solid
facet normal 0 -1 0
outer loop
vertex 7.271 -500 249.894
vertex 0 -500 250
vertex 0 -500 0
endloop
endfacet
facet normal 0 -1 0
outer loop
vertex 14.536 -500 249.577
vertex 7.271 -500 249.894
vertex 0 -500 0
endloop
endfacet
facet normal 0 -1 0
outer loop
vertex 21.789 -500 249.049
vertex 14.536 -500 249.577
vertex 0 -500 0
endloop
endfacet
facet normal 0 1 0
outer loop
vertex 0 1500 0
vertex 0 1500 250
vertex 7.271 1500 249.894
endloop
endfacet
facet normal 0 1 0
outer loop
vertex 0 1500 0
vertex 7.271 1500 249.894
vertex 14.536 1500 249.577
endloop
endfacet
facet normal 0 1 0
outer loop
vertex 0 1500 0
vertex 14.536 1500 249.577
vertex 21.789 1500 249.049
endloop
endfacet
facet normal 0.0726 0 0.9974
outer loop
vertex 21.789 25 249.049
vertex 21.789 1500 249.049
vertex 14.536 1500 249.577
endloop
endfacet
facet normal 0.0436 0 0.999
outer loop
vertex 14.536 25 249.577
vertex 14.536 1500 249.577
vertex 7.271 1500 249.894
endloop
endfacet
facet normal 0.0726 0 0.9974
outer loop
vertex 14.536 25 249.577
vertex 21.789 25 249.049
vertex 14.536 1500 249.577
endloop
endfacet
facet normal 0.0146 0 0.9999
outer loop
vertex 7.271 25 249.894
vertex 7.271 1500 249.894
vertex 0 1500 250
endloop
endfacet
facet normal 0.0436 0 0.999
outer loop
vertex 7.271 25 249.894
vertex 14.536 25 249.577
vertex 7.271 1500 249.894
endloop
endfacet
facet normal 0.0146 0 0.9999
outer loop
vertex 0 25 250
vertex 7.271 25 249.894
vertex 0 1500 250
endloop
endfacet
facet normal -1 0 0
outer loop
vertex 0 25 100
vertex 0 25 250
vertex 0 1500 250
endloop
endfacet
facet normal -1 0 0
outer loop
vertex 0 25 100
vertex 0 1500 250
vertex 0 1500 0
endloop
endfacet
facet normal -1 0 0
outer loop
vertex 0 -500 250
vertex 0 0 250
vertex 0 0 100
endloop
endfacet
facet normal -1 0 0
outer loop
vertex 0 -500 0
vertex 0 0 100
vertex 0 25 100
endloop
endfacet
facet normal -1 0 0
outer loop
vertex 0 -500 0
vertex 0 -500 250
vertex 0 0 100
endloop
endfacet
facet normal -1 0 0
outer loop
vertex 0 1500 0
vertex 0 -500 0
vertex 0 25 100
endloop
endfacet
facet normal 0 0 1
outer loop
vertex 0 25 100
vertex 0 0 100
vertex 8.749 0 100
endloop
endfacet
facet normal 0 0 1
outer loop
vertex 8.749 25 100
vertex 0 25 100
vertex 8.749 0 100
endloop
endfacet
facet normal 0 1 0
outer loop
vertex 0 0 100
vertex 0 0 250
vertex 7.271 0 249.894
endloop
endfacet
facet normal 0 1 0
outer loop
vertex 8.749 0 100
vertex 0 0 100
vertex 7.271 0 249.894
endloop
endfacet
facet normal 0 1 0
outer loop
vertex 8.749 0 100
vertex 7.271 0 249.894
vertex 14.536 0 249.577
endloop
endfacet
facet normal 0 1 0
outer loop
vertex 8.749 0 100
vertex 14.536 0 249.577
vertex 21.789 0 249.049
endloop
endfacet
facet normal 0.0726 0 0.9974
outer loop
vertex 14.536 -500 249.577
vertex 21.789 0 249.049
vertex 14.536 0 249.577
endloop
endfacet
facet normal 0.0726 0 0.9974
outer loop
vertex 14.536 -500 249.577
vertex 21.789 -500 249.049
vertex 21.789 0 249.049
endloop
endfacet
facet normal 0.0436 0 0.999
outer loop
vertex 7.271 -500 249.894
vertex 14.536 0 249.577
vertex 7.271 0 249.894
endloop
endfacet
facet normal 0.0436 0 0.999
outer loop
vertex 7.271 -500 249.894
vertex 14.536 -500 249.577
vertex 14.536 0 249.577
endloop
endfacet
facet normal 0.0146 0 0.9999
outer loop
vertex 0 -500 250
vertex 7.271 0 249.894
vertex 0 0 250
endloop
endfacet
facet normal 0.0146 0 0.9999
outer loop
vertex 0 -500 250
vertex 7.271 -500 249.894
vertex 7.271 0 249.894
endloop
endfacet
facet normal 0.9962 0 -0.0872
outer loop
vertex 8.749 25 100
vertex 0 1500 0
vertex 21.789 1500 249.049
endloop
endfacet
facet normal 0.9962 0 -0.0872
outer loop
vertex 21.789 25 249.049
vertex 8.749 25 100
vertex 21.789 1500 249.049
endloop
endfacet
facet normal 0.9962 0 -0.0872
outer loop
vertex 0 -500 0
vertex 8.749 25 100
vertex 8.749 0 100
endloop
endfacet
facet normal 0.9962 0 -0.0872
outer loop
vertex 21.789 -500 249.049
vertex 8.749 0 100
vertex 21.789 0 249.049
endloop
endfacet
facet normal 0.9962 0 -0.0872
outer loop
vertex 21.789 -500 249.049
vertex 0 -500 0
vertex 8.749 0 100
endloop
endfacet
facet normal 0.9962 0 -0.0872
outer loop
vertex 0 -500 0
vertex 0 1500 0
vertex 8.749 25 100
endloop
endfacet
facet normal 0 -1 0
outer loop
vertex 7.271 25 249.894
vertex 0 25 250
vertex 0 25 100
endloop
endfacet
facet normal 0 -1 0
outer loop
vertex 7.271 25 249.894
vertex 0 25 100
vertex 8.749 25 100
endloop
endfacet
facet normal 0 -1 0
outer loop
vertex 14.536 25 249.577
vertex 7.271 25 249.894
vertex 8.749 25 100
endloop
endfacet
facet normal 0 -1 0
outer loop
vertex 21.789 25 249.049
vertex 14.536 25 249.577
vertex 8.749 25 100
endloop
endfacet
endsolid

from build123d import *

# Parameters (mm, degrees)
F0_R     = 250
F2_DEPTH = 500
F1_R     = 250
F1_W     = 200
F1_H     = 200
F3_DEPTH = 1500
F1_W_2   = 959.411026
F1_H_2   = 659
F4_DEPTH = 25
F6_DEPTH = 2000


with BuildPart() as f2:
    # F0 (on Front) → F2 (new body)
    with BuildSketch(Plane.XZ):
        Circle(F0_R)
    extrude(amount=F2_DEPTH)

    # F1 (on face) → F3 (join)
    with BuildSketch(Plane.XZ):
        Circle(F1_R)
        Rectangle(F1_W, F1_H, mode=Mode.SUBTRACT)
        Rectangle(F1_W, F1_H)
    extrude(amount=-F3_DEPTH)

    # F1 (on face) → F4 (cut)
    with BuildSketch(Plane.XZ):
        Rectangle(F1_W_2, F1_H_2)
        Rectangle(F1_W, F1_H, mode=Mode.SUBTRACT)
    extrude(amount=-F4_DEPTH, mode=Mode.SUBTRACT)

    # F5 (on face) → F6 (intersect)
    with BuildSketch(Plane.XZ.offset(500)):
        with BuildLine():
            Line((0, 250), (0, 0))
            Line((0, 0), (21.788936, 249.048675))
            ThreePointArc((21.788936, 249.048675), (10.904847, 249.762055), (0, 250))
        make_face()
    extrude(amount=-F6_DEPTH, mode=Mode.INTERSECT)


solid = f2.part
